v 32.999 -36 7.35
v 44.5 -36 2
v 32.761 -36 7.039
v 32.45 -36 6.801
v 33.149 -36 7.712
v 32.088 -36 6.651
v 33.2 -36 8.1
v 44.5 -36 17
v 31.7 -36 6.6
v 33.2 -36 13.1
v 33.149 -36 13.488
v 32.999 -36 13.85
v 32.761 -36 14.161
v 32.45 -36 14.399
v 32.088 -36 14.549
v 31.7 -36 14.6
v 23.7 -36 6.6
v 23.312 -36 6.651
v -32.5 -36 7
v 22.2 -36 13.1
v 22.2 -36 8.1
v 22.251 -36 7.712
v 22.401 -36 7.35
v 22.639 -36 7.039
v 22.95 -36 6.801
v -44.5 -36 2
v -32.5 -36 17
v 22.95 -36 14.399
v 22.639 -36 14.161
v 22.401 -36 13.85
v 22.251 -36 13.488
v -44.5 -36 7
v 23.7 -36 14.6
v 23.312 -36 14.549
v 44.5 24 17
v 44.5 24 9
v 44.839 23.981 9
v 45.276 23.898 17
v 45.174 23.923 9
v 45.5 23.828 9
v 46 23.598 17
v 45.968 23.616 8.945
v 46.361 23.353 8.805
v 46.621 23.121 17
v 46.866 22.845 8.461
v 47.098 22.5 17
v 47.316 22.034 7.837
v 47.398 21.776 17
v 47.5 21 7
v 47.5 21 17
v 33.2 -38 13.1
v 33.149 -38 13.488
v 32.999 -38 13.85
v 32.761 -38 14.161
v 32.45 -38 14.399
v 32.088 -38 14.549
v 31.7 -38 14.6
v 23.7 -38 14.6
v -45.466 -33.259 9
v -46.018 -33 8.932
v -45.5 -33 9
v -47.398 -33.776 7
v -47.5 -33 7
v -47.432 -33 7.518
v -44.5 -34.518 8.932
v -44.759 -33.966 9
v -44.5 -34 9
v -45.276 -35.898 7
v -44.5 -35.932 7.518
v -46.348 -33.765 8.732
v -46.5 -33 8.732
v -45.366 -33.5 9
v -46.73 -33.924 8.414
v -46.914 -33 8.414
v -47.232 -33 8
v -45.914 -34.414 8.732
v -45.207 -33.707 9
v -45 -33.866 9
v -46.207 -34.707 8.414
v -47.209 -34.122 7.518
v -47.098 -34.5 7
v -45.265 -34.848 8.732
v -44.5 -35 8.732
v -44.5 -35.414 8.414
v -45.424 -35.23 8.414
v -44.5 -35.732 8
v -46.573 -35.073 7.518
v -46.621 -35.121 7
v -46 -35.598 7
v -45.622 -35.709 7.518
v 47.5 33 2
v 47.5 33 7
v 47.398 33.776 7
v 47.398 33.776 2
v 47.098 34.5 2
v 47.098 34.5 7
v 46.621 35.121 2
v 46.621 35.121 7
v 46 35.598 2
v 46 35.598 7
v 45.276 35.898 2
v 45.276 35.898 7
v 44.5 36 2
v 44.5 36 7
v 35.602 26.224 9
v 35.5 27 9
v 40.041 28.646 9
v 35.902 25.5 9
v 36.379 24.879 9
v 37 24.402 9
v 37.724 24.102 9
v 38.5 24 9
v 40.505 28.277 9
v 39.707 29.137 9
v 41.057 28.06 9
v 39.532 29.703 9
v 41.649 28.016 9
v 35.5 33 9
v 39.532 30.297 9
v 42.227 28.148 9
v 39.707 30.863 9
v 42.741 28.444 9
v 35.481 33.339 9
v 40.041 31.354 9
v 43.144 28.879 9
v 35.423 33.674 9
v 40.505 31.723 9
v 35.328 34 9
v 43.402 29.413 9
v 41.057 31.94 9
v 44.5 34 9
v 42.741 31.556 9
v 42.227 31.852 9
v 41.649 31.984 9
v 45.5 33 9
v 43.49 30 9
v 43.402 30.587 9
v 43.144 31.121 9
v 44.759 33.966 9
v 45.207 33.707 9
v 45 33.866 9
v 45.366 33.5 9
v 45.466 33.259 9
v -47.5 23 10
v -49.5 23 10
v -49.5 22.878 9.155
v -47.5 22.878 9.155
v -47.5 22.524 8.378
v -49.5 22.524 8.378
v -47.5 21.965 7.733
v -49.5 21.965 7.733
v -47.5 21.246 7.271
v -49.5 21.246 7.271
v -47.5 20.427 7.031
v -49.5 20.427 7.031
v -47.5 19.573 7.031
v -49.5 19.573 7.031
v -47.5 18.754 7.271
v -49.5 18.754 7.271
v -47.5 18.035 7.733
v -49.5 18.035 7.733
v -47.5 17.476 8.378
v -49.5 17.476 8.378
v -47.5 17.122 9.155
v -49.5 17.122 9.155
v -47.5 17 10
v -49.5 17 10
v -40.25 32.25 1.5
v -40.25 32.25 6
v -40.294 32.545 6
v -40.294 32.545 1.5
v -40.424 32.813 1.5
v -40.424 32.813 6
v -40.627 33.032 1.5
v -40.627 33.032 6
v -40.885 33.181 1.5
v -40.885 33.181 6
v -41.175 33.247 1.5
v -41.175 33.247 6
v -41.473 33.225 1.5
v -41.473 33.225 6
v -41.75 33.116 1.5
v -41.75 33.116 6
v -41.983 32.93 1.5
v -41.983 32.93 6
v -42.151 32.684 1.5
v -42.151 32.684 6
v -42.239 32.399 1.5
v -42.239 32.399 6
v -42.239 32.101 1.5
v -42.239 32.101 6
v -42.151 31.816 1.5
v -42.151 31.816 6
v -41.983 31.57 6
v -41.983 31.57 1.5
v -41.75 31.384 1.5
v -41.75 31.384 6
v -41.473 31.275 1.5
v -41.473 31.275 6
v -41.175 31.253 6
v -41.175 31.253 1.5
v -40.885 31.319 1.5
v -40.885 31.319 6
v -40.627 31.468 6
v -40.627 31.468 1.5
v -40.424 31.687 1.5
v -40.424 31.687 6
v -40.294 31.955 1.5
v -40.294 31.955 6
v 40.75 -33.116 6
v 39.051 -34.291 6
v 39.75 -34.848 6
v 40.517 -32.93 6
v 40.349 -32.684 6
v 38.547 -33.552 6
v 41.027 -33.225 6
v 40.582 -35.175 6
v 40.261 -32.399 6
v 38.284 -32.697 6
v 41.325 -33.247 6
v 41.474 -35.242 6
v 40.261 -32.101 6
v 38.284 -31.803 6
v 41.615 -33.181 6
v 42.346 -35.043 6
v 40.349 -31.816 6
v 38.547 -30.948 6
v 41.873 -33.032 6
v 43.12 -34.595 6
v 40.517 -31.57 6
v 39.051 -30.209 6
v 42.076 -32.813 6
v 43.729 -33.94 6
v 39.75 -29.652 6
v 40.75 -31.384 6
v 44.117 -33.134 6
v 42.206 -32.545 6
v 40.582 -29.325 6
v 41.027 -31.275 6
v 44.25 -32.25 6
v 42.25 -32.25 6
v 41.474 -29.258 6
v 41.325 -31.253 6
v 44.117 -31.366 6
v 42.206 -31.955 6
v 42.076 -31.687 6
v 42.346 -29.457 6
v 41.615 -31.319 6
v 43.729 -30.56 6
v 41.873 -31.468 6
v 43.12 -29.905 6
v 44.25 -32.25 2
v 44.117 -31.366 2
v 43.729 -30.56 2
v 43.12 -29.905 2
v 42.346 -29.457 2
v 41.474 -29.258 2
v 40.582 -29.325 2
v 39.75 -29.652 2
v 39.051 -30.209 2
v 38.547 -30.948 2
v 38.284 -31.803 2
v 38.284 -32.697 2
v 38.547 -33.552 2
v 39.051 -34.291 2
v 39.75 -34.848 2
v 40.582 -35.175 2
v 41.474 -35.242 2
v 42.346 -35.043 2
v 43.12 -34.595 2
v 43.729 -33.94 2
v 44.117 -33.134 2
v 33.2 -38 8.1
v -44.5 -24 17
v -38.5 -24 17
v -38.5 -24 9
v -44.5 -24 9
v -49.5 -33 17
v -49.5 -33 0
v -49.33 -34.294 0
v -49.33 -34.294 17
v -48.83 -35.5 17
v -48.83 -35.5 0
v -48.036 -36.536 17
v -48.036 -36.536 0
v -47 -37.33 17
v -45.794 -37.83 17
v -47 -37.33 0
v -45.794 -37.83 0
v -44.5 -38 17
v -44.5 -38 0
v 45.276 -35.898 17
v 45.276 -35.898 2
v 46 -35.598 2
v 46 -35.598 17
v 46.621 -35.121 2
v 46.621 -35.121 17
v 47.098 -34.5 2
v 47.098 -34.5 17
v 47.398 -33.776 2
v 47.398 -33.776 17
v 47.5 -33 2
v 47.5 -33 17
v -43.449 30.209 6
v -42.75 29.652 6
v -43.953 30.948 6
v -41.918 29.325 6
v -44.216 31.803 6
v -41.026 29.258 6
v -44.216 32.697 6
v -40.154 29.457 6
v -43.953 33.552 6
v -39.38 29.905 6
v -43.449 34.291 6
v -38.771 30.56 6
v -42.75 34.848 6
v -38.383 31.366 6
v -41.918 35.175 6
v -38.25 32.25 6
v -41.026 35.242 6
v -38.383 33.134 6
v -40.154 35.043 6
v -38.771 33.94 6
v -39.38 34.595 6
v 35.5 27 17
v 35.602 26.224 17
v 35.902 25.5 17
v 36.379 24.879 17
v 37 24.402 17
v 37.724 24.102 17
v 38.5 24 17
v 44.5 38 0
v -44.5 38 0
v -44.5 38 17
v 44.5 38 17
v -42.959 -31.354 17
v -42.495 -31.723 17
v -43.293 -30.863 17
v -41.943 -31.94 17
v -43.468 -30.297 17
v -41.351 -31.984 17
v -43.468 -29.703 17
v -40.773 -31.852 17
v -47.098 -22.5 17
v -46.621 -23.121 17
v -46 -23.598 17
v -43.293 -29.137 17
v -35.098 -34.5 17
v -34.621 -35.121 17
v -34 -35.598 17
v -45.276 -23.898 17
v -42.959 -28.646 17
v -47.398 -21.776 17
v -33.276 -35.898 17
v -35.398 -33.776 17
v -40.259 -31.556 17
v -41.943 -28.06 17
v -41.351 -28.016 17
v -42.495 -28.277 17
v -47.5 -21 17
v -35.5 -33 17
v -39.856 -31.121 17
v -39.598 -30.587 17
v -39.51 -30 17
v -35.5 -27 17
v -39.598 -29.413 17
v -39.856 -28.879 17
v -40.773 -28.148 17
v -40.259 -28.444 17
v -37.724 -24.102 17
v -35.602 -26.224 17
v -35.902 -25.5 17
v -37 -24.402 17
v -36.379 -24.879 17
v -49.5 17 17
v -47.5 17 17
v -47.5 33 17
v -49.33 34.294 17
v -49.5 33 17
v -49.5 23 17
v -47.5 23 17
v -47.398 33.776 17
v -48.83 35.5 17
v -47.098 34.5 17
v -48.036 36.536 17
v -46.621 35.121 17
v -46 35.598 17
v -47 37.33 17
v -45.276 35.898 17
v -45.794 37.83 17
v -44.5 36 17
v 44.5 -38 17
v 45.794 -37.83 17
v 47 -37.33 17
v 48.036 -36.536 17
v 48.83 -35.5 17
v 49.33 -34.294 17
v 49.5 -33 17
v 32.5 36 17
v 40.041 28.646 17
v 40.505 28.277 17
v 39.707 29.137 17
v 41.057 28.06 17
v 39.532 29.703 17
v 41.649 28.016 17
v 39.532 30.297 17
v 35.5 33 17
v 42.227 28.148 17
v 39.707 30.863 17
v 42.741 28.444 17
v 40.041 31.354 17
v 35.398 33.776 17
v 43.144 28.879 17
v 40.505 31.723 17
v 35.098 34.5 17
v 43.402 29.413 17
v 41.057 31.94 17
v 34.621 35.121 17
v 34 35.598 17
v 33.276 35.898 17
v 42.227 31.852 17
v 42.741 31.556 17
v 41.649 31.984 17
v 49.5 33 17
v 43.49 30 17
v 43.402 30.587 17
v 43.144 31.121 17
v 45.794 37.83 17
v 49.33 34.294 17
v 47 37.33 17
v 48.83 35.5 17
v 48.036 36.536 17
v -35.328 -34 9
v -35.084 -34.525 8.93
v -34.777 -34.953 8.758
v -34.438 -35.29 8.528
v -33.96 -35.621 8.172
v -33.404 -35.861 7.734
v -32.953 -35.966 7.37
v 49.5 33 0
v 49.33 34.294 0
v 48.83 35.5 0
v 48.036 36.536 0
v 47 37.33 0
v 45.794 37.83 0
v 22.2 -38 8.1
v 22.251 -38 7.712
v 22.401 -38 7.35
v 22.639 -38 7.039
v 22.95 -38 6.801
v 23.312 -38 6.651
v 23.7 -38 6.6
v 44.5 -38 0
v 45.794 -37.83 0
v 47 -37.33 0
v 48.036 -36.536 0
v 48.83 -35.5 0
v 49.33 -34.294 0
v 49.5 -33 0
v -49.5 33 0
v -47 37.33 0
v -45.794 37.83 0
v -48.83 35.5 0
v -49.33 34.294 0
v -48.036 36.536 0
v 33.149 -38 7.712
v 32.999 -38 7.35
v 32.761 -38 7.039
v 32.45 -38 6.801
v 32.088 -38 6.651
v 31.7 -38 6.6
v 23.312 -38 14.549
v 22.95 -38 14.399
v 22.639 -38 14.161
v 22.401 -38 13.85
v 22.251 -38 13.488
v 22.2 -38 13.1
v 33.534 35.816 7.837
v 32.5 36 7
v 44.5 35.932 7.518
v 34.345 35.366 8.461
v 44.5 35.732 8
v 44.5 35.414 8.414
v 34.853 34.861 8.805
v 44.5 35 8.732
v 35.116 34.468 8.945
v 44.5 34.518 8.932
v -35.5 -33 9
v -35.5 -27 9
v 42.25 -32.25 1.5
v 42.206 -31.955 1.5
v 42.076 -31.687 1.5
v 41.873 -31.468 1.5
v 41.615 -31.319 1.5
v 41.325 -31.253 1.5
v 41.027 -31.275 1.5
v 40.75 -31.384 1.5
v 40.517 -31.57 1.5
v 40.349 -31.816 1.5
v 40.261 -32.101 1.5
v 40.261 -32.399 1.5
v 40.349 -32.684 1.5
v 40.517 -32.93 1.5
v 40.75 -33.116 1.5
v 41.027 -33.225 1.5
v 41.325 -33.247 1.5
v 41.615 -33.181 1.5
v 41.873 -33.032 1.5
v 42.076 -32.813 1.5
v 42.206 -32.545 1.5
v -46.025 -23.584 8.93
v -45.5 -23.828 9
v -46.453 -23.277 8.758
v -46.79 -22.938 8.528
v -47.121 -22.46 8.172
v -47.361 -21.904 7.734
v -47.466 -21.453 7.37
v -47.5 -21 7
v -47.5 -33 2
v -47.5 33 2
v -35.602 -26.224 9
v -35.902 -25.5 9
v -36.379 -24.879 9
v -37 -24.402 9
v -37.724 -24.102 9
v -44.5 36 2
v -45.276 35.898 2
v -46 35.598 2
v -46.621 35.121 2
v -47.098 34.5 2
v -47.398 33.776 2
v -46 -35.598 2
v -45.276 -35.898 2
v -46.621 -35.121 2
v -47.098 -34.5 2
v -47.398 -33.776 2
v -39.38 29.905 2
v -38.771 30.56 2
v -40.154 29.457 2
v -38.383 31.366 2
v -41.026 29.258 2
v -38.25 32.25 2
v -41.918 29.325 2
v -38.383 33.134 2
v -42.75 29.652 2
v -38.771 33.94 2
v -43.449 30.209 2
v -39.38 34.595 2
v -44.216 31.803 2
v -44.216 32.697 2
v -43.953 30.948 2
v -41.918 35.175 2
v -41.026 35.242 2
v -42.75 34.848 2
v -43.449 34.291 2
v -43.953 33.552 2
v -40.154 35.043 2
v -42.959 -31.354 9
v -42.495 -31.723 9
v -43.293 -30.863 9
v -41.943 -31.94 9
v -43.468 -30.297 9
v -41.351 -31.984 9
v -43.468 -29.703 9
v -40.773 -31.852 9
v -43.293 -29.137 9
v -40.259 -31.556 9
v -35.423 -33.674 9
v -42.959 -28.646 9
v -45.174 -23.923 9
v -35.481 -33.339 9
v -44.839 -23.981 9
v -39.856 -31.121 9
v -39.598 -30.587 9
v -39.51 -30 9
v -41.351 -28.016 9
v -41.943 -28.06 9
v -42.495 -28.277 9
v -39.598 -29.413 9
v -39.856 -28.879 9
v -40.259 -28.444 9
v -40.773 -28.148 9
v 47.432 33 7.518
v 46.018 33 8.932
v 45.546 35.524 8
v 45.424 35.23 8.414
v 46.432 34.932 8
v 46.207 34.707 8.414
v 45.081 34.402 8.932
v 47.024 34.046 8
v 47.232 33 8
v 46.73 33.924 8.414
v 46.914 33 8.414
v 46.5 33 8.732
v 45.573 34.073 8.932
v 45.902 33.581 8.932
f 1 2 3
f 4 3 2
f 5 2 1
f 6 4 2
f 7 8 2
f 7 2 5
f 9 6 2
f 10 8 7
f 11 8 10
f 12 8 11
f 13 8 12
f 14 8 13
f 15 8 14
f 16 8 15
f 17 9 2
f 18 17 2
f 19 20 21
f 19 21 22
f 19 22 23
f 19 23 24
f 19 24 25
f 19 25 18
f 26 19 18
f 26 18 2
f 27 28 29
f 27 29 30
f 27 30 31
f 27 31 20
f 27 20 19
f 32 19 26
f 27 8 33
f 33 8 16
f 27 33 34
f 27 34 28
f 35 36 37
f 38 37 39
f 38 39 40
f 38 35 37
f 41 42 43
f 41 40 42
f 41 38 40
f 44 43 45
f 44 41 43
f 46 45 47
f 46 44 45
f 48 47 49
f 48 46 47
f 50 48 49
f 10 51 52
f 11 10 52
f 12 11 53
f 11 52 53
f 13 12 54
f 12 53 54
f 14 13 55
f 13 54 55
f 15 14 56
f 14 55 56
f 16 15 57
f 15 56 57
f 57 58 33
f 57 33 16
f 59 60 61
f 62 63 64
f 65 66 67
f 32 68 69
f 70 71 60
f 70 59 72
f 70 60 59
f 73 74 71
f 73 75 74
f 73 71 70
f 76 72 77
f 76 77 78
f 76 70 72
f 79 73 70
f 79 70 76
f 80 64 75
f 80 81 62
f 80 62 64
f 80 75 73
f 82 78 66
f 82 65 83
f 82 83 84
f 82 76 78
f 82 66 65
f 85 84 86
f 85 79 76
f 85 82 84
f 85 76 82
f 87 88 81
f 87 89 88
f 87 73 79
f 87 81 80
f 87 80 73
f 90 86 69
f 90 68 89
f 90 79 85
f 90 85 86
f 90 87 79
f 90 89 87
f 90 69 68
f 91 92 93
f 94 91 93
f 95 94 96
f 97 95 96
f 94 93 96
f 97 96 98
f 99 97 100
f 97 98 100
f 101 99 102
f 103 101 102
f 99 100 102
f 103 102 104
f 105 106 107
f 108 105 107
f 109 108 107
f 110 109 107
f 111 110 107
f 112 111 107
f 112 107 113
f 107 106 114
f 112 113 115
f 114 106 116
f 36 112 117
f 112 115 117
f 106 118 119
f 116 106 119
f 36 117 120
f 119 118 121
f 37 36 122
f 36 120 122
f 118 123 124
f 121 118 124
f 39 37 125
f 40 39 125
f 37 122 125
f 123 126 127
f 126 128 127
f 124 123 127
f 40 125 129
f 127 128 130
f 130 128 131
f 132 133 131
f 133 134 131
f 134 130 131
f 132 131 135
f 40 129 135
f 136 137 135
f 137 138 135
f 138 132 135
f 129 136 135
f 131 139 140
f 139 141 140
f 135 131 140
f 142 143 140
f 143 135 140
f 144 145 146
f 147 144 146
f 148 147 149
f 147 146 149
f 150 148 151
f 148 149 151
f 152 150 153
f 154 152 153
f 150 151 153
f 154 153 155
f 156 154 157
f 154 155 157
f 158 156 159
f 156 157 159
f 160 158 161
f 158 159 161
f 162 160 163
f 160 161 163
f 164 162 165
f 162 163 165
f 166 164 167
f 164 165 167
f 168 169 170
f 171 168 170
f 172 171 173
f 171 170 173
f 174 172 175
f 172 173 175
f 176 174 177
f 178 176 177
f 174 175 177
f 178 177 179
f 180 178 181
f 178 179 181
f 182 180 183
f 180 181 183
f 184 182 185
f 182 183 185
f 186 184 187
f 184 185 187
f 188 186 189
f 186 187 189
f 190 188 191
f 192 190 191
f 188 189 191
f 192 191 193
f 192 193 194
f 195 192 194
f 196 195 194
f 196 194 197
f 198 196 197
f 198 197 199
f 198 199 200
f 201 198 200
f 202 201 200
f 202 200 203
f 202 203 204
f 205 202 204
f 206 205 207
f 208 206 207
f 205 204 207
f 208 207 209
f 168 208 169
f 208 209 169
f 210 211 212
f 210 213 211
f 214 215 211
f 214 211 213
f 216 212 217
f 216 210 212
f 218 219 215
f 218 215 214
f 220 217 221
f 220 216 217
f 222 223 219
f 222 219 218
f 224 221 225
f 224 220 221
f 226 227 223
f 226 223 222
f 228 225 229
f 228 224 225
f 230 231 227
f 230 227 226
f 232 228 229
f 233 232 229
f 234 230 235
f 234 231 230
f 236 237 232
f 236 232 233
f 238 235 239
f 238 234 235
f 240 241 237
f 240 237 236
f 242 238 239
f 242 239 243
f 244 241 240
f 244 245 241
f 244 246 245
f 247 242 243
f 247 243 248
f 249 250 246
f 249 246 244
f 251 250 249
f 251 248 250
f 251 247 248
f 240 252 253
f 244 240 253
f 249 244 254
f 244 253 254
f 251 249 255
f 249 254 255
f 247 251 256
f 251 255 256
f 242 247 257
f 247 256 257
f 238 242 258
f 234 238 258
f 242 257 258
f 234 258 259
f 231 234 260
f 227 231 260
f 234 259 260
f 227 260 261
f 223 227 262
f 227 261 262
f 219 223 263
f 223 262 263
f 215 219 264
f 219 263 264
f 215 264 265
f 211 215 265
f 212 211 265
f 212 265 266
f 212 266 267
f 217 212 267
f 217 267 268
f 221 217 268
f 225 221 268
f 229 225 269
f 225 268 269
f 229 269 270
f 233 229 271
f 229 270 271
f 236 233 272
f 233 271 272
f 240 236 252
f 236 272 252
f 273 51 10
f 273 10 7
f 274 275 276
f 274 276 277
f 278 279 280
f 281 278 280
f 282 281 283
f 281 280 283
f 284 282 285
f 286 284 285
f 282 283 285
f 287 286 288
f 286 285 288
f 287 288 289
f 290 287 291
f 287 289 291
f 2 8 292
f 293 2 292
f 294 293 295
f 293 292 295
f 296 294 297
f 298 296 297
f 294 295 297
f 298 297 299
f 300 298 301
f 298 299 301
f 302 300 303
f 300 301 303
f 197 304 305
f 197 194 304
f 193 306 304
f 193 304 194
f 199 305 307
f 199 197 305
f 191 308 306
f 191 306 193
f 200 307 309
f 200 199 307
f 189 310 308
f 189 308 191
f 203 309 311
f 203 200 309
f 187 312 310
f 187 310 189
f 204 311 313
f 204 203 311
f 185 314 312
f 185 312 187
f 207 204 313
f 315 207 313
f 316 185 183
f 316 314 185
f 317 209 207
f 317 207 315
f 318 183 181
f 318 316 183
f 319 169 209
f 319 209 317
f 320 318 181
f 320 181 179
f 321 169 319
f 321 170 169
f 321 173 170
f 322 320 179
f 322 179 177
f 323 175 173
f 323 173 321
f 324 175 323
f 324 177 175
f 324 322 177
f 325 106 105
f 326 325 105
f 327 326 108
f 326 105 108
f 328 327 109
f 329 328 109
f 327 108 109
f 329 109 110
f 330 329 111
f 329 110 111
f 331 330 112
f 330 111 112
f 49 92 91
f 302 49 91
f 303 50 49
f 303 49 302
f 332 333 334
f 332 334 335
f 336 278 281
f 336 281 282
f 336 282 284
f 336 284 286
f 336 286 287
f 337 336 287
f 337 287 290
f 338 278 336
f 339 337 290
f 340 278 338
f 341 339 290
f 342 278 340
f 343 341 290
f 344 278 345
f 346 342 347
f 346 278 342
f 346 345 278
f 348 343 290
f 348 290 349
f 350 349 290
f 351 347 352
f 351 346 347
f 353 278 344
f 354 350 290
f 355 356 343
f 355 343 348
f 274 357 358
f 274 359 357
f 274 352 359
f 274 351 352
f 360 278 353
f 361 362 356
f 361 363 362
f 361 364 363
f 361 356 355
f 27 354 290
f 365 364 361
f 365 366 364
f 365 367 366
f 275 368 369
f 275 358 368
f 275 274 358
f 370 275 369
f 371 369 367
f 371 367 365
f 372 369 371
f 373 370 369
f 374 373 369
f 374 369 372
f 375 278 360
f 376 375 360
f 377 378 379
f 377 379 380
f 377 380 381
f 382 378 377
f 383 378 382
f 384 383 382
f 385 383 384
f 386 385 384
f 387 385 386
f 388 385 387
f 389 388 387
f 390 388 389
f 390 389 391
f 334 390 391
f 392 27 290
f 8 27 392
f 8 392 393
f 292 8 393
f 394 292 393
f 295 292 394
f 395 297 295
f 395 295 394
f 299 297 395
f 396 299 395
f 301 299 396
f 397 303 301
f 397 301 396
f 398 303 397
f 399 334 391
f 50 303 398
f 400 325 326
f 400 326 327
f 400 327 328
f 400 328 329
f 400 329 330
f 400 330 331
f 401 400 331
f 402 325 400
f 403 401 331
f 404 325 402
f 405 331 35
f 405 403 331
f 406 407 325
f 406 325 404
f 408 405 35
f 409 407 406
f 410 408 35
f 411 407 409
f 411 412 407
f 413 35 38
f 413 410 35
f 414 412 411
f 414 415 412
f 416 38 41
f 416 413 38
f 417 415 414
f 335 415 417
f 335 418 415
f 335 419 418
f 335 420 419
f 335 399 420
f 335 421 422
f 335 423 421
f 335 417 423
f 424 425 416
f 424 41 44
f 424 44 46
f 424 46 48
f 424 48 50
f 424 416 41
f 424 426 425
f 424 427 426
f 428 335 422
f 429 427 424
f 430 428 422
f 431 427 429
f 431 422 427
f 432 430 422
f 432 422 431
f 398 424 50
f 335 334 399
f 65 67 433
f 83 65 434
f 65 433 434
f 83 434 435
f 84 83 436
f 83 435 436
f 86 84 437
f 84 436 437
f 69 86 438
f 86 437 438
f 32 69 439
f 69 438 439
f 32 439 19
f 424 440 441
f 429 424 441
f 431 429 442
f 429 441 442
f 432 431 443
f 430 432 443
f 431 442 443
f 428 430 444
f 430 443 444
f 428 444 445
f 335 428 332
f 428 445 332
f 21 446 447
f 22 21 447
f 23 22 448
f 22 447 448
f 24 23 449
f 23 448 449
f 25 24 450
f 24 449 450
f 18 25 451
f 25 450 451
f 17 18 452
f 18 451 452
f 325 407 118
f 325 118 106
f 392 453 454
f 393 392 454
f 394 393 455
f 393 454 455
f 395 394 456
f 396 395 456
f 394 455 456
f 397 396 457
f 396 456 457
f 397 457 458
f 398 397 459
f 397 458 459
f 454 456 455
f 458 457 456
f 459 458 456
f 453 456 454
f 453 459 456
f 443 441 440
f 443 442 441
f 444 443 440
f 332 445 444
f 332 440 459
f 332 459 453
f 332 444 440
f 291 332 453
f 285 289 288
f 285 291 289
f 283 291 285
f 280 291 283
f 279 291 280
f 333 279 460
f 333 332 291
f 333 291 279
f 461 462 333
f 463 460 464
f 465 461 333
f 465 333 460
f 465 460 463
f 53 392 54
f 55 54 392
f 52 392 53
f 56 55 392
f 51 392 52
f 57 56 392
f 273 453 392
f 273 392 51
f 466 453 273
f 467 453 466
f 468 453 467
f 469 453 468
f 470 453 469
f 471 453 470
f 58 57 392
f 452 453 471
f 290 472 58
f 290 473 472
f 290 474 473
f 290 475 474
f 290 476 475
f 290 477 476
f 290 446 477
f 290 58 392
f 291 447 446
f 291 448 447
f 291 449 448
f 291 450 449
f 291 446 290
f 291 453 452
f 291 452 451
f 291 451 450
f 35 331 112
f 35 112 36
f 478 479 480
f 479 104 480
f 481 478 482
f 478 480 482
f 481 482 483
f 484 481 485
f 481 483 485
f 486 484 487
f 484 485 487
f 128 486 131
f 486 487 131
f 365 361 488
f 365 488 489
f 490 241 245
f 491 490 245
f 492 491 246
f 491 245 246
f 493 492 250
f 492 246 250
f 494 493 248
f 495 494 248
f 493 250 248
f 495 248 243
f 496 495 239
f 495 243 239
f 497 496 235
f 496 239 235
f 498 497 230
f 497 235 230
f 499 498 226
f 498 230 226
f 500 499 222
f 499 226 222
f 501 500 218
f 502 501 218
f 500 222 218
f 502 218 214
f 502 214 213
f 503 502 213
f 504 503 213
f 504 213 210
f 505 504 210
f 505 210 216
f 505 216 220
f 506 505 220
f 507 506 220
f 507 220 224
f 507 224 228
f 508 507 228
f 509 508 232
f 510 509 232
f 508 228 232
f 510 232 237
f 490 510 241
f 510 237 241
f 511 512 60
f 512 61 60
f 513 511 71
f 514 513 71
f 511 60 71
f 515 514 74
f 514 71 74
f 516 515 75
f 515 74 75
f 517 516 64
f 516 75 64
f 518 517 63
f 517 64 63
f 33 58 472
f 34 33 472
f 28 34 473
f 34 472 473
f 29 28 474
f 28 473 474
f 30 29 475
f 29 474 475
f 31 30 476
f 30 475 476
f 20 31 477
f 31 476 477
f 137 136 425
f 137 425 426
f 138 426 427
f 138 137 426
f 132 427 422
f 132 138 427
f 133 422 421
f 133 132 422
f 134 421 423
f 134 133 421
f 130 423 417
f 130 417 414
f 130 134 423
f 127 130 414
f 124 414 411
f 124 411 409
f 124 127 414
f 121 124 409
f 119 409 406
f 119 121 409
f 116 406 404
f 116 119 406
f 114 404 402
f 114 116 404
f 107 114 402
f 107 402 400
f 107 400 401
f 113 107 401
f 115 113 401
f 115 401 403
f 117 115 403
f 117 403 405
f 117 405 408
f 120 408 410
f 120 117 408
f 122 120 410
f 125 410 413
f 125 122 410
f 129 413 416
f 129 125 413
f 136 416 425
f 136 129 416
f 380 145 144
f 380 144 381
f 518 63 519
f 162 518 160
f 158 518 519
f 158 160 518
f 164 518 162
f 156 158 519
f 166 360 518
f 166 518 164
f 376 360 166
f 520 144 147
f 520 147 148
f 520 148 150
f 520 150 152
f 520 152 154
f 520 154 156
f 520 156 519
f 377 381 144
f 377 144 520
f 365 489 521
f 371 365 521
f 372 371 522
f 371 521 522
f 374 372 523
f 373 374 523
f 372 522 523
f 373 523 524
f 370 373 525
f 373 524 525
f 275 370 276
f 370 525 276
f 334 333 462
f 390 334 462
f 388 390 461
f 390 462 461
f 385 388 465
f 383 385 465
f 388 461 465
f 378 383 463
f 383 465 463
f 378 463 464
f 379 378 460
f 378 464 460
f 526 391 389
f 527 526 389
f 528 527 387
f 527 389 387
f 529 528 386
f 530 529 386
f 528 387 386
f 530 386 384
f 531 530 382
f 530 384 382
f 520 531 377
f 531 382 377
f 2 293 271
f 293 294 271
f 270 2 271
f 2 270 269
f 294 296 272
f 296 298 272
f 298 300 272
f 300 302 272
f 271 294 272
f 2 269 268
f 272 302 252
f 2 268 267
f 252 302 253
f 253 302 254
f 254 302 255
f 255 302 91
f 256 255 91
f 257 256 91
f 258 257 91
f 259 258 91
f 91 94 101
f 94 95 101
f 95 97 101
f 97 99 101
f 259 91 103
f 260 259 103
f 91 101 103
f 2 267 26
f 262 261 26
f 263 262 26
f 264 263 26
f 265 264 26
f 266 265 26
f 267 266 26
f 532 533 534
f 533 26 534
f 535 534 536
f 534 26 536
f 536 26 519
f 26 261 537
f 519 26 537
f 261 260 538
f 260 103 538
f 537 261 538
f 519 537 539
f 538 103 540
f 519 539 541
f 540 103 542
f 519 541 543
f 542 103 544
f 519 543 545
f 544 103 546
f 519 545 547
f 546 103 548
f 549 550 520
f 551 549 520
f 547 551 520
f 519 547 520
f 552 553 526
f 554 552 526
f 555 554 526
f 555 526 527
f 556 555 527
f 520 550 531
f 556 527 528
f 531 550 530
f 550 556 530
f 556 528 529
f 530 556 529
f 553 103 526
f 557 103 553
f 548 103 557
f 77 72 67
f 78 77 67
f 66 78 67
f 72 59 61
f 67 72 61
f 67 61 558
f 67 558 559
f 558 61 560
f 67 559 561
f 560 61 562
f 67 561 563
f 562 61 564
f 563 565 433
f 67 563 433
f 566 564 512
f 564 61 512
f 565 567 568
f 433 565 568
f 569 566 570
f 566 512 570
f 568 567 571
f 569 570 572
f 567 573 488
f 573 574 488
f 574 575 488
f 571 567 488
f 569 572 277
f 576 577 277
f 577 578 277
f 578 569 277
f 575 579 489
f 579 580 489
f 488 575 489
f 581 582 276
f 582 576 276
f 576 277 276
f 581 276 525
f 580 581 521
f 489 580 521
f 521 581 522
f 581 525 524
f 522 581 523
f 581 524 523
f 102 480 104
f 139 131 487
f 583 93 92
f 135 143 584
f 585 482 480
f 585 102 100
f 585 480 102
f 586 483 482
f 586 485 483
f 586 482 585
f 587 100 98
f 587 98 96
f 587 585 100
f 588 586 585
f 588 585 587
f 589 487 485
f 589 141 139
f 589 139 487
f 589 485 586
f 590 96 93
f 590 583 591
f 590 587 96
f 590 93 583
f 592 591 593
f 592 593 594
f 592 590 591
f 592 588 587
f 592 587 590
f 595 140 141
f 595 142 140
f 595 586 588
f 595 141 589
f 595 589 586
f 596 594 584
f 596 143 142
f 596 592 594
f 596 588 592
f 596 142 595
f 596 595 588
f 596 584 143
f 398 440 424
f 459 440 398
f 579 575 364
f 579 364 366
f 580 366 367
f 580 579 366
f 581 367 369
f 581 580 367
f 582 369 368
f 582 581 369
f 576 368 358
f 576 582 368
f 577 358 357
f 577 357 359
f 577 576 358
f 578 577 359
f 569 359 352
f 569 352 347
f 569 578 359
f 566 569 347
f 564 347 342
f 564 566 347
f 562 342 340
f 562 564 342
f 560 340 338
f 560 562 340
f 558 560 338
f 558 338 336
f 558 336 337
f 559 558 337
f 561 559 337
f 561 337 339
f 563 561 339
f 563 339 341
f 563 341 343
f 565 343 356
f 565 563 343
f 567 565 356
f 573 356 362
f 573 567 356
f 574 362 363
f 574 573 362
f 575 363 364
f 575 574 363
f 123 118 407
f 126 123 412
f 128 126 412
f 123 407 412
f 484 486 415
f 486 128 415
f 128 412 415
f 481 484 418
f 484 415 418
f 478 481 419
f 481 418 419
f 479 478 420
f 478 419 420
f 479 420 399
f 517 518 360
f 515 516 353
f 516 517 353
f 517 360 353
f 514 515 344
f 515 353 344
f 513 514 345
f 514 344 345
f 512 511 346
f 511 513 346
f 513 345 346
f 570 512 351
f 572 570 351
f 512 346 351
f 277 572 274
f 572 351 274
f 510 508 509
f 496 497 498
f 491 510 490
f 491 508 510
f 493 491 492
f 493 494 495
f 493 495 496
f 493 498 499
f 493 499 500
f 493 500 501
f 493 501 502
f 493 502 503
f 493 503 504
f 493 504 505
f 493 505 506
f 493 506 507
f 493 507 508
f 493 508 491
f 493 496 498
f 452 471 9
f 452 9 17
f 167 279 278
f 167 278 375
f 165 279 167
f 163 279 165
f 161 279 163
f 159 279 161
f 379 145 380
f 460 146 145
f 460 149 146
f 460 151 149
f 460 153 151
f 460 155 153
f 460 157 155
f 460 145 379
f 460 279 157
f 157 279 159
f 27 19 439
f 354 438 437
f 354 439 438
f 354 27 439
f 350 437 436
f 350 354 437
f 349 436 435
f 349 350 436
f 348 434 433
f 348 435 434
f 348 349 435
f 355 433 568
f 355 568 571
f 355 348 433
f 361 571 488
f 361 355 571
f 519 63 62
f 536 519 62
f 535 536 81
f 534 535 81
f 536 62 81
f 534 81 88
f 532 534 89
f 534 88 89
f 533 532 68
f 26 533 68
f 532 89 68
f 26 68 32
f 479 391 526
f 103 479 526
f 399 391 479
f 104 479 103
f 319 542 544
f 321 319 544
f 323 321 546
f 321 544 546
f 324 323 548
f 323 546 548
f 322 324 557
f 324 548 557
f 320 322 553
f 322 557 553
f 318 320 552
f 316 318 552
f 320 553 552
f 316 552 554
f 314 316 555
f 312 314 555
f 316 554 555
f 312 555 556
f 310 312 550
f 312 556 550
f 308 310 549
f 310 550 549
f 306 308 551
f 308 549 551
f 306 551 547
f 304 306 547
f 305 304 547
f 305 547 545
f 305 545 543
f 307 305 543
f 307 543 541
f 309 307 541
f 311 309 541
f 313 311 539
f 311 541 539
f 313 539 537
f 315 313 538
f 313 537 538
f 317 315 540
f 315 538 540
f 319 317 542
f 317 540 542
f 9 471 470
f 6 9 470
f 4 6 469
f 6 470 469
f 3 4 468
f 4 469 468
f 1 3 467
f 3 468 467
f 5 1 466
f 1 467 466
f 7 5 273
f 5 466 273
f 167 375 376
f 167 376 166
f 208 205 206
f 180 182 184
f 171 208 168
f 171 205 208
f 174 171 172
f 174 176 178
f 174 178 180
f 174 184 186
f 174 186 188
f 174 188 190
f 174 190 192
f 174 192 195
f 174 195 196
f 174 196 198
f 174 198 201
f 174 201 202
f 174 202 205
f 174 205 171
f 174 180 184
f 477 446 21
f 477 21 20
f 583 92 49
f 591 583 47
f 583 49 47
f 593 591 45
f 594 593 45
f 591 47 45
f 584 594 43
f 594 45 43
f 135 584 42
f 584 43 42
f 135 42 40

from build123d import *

# Parameters (mm, degrees)
PAD_DEPTH       = 17
POCKET_DEPTH    = 15
SKETCH002_R     = 3
PAD001_DEPTH    = 4
POCKET002_DEPTH = 5
POCKET003_DEPTH = 5
SKETCH006_R     = 1.99
PAD002_DEPTH    = 8
FILLET_R        = 3
FILLET001_R     = 2
FILLET002_R     = 2
SKETCH007_R     = 1
POCKET004_DEPTH = 4.5


with BuildPart() as part:
    # Sketch → Pad (new body)
    with BuildSketch(Plane.XY):
        with BuildLine():
            Line((-44.5, 38), (44.5, 38))
            ThreePointArc((49.5, 33), (48.035534, 36.535534), (44.5, 38))
            Line((49.5, 33), (49.5, -33))
            ThreePointArc((44.5, -38), (48.035534, -36.535534), (49.5, -33))
            Line((44.5, -38), (-44.5, -38))
            ThreePointArc((-49.5, -33), (-48.035534, -36.535534), (-44.5, -38))
            Line((-49.5, -33), (-49.5, 33))
            ThreePointArc((-44.5, 38), (-48.035534, 36.535534), (-49.5, 33))
        make_face()
    extrude(amount=PAD_DEPTH)

    # Sketch001 (on Face10 of Pad) → Pocket (cut)
    with BuildSketch(Plane.XY.offset(17)):
        with BuildLine():
            Line((-44.5, 36), (44.5, 36))
            ThreePointArc((47.5, 33), (46.62132, 35.12132), (44.5, 36))
            Line((47.5, 33), (47.5, -33))
            ThreePointArc((44.5, -36), (46.62132, -35.12132), (47.5, -33))
            Line((44.5, -36), (-44.5, -36))
            ThreePointArc((-47.5, -33), (-46.62132, -35.12132), (-44.5, -36))
            Line((-47.5, -33), (-47.5, 33))
            ThreePointArc((-44.5, 36), (-46.62132, 35.12132), (-47.5, 33))
        make_face()
    extrude(amount=-POCKET_DEPTH, mode=Mode.SUBTRACT)

    # Sketch002 (on Face19 of Pocket) → Pad001 (join)
    with BuildSketch(Plane.XY.offset(2)):
        with Locations((-41.25, 32.25)):
            Circle(SKETCH002_R)
        with Locations((41.25, -32.25)):
            Circle(SKETCH002_R)
    extrude(amount=PAD001_DEPTH)

    # Sketch004 → Pocket002 (cut)
    with BuildSketch(Plane.XZ.offset(38)):
        with BuildLine():
            Line((23.7, 14.6), (31.7, 14.6))
            ThreePointArc((33.2, 13.1), (32.76066, 14.16066), (31.7, 14.6))
            Line((33.2, 13.1), (33.2, 8.1))
            ThreePointArc((31.7, 6.6), (32.76066, 7.03934), (33.2, 8.1))
            Line((31.7, 6.6), (23.7, 6.6))
            ThreePointArc((22.2, 8.1), (22.63934, 7.03934), (23.7, 6.6))
            Line((22.2, 8.1), (22.2, 13.1))
            ThreePointArc((23.7, 14.6), (22.63934, 14.16066), (22.2, 13.1))
        make_face()
    extrude(amount=-POCKET002_DEPTH, mode=Mode.SUBTRACT)

    # Sketch005 (on Face1 of Pocket002) → Pocket003 (cut)
    with BuildSketch(Plane(origin=(-49.5, 0, 0), x_dir=(0, -1, 0), z_dir=(-1, 0, 0))):
        with BuildLine():
            Line((-23, 17), (-17, 17))
            Line((-17, 17), (-17, 10))
            ThreePointArc((-23, 10), (-20, 7), (-17, 10))
            Line((-23, 10), (-23, 17))
        make_face()
    extrude(amount=-POCKET003_DEPTH, mode=Mode.SUBTRACT)

    # Sketch006 (on Face30 of Pocket003) → Pad002 (join)
    with BuildSketch(Plane.XY.offset(9)):
        with BuildLine():
            Line((44.5, 36), (35.5, 36))
            Line((35.5, 36), (35.5, 27))
            ThreePointArc((35.5, 27), (36.37868, 24.87868), (38.5, 24))
            Line((38.5, 24), (47.5, 24))
            Line((47.5, 24), (47.5, 33))
            ThreePointArc((47.5, 33), (46.62132, 35.12132), (44.5, 36))
        make_face()
        with Locations((41.5, 30)):
            Circle(SKETCH006_R, mode=Mode.SUBTRACT)
        with BuildLine():
            Line((-38.5, -24), (-47.5, -24))
            Line((-47.5, -24), (-47.5, -33))
            ThreePointArc((-47.5, -33), (-46.62132, -35.12132), (-44.5, -36))
            Line((-44.5, -36), (-35.5, -36))
            Line((-35.5, -36), (-35.5, -27))
            ThreePointArc((-35.5, -27), (-36.37868, -24.87868), (-38.5, -24))
        make_face()
        with Locations((-41.5, -30)):
            Circle(SKETCH006_R, mode=Mode.SUBTRACT)
    extrude(amount=PAD002_DEPTH)

    # Fillet
    fillet_edges = [part.edges().sort_by_distance(p)[0] for p in [
        (47.5, 24, 13),
        (35.5, 36, 13),
        (-35.5, -36, 13),
        (-47.5, -24, 13),
    ]]
    fillet(fillet_edges, radius=FILLET_R)

    # Fillet001
    fillet001_edges = [part.edges().sort_by_distance(p)[0] for p in [
        (40, 36, 9),
        (47.5, 28.5, 9),
        (47.5, 22.5, 9),
        (34, 36, 9),
    ]]
    fillet(fillet001_edges, radius=FILLET001_R)

    # Fillet002
    fillet002_edges = [part.edges().sort_by_distance(p)[0] for p in [
        (-46.62132, -35.12132, 9),
        (-47.5, -28.5, 9),
        (-47.5, -22.5, 9),
        (-40, -36, 9),
        (-34, -36, 9),
    ]]
    fillet(fillet002_edges, radius=FILLET002_R)

    # Sketch007 (on Face54 of Fillet002) → Pocket004 (cut)
    with BuildSketch(Plane.XY.offset(6)):
        with Locations((41.25, -32.25)):
            Circle(SKETCH007_R)
        with Locations((-41.25, 32.25)):
            Circle(SKETCH007_R)
    extrude(amount=-POCKET004_DEPTH, mode=Mode.SUBTRACT)


solid = part.part
